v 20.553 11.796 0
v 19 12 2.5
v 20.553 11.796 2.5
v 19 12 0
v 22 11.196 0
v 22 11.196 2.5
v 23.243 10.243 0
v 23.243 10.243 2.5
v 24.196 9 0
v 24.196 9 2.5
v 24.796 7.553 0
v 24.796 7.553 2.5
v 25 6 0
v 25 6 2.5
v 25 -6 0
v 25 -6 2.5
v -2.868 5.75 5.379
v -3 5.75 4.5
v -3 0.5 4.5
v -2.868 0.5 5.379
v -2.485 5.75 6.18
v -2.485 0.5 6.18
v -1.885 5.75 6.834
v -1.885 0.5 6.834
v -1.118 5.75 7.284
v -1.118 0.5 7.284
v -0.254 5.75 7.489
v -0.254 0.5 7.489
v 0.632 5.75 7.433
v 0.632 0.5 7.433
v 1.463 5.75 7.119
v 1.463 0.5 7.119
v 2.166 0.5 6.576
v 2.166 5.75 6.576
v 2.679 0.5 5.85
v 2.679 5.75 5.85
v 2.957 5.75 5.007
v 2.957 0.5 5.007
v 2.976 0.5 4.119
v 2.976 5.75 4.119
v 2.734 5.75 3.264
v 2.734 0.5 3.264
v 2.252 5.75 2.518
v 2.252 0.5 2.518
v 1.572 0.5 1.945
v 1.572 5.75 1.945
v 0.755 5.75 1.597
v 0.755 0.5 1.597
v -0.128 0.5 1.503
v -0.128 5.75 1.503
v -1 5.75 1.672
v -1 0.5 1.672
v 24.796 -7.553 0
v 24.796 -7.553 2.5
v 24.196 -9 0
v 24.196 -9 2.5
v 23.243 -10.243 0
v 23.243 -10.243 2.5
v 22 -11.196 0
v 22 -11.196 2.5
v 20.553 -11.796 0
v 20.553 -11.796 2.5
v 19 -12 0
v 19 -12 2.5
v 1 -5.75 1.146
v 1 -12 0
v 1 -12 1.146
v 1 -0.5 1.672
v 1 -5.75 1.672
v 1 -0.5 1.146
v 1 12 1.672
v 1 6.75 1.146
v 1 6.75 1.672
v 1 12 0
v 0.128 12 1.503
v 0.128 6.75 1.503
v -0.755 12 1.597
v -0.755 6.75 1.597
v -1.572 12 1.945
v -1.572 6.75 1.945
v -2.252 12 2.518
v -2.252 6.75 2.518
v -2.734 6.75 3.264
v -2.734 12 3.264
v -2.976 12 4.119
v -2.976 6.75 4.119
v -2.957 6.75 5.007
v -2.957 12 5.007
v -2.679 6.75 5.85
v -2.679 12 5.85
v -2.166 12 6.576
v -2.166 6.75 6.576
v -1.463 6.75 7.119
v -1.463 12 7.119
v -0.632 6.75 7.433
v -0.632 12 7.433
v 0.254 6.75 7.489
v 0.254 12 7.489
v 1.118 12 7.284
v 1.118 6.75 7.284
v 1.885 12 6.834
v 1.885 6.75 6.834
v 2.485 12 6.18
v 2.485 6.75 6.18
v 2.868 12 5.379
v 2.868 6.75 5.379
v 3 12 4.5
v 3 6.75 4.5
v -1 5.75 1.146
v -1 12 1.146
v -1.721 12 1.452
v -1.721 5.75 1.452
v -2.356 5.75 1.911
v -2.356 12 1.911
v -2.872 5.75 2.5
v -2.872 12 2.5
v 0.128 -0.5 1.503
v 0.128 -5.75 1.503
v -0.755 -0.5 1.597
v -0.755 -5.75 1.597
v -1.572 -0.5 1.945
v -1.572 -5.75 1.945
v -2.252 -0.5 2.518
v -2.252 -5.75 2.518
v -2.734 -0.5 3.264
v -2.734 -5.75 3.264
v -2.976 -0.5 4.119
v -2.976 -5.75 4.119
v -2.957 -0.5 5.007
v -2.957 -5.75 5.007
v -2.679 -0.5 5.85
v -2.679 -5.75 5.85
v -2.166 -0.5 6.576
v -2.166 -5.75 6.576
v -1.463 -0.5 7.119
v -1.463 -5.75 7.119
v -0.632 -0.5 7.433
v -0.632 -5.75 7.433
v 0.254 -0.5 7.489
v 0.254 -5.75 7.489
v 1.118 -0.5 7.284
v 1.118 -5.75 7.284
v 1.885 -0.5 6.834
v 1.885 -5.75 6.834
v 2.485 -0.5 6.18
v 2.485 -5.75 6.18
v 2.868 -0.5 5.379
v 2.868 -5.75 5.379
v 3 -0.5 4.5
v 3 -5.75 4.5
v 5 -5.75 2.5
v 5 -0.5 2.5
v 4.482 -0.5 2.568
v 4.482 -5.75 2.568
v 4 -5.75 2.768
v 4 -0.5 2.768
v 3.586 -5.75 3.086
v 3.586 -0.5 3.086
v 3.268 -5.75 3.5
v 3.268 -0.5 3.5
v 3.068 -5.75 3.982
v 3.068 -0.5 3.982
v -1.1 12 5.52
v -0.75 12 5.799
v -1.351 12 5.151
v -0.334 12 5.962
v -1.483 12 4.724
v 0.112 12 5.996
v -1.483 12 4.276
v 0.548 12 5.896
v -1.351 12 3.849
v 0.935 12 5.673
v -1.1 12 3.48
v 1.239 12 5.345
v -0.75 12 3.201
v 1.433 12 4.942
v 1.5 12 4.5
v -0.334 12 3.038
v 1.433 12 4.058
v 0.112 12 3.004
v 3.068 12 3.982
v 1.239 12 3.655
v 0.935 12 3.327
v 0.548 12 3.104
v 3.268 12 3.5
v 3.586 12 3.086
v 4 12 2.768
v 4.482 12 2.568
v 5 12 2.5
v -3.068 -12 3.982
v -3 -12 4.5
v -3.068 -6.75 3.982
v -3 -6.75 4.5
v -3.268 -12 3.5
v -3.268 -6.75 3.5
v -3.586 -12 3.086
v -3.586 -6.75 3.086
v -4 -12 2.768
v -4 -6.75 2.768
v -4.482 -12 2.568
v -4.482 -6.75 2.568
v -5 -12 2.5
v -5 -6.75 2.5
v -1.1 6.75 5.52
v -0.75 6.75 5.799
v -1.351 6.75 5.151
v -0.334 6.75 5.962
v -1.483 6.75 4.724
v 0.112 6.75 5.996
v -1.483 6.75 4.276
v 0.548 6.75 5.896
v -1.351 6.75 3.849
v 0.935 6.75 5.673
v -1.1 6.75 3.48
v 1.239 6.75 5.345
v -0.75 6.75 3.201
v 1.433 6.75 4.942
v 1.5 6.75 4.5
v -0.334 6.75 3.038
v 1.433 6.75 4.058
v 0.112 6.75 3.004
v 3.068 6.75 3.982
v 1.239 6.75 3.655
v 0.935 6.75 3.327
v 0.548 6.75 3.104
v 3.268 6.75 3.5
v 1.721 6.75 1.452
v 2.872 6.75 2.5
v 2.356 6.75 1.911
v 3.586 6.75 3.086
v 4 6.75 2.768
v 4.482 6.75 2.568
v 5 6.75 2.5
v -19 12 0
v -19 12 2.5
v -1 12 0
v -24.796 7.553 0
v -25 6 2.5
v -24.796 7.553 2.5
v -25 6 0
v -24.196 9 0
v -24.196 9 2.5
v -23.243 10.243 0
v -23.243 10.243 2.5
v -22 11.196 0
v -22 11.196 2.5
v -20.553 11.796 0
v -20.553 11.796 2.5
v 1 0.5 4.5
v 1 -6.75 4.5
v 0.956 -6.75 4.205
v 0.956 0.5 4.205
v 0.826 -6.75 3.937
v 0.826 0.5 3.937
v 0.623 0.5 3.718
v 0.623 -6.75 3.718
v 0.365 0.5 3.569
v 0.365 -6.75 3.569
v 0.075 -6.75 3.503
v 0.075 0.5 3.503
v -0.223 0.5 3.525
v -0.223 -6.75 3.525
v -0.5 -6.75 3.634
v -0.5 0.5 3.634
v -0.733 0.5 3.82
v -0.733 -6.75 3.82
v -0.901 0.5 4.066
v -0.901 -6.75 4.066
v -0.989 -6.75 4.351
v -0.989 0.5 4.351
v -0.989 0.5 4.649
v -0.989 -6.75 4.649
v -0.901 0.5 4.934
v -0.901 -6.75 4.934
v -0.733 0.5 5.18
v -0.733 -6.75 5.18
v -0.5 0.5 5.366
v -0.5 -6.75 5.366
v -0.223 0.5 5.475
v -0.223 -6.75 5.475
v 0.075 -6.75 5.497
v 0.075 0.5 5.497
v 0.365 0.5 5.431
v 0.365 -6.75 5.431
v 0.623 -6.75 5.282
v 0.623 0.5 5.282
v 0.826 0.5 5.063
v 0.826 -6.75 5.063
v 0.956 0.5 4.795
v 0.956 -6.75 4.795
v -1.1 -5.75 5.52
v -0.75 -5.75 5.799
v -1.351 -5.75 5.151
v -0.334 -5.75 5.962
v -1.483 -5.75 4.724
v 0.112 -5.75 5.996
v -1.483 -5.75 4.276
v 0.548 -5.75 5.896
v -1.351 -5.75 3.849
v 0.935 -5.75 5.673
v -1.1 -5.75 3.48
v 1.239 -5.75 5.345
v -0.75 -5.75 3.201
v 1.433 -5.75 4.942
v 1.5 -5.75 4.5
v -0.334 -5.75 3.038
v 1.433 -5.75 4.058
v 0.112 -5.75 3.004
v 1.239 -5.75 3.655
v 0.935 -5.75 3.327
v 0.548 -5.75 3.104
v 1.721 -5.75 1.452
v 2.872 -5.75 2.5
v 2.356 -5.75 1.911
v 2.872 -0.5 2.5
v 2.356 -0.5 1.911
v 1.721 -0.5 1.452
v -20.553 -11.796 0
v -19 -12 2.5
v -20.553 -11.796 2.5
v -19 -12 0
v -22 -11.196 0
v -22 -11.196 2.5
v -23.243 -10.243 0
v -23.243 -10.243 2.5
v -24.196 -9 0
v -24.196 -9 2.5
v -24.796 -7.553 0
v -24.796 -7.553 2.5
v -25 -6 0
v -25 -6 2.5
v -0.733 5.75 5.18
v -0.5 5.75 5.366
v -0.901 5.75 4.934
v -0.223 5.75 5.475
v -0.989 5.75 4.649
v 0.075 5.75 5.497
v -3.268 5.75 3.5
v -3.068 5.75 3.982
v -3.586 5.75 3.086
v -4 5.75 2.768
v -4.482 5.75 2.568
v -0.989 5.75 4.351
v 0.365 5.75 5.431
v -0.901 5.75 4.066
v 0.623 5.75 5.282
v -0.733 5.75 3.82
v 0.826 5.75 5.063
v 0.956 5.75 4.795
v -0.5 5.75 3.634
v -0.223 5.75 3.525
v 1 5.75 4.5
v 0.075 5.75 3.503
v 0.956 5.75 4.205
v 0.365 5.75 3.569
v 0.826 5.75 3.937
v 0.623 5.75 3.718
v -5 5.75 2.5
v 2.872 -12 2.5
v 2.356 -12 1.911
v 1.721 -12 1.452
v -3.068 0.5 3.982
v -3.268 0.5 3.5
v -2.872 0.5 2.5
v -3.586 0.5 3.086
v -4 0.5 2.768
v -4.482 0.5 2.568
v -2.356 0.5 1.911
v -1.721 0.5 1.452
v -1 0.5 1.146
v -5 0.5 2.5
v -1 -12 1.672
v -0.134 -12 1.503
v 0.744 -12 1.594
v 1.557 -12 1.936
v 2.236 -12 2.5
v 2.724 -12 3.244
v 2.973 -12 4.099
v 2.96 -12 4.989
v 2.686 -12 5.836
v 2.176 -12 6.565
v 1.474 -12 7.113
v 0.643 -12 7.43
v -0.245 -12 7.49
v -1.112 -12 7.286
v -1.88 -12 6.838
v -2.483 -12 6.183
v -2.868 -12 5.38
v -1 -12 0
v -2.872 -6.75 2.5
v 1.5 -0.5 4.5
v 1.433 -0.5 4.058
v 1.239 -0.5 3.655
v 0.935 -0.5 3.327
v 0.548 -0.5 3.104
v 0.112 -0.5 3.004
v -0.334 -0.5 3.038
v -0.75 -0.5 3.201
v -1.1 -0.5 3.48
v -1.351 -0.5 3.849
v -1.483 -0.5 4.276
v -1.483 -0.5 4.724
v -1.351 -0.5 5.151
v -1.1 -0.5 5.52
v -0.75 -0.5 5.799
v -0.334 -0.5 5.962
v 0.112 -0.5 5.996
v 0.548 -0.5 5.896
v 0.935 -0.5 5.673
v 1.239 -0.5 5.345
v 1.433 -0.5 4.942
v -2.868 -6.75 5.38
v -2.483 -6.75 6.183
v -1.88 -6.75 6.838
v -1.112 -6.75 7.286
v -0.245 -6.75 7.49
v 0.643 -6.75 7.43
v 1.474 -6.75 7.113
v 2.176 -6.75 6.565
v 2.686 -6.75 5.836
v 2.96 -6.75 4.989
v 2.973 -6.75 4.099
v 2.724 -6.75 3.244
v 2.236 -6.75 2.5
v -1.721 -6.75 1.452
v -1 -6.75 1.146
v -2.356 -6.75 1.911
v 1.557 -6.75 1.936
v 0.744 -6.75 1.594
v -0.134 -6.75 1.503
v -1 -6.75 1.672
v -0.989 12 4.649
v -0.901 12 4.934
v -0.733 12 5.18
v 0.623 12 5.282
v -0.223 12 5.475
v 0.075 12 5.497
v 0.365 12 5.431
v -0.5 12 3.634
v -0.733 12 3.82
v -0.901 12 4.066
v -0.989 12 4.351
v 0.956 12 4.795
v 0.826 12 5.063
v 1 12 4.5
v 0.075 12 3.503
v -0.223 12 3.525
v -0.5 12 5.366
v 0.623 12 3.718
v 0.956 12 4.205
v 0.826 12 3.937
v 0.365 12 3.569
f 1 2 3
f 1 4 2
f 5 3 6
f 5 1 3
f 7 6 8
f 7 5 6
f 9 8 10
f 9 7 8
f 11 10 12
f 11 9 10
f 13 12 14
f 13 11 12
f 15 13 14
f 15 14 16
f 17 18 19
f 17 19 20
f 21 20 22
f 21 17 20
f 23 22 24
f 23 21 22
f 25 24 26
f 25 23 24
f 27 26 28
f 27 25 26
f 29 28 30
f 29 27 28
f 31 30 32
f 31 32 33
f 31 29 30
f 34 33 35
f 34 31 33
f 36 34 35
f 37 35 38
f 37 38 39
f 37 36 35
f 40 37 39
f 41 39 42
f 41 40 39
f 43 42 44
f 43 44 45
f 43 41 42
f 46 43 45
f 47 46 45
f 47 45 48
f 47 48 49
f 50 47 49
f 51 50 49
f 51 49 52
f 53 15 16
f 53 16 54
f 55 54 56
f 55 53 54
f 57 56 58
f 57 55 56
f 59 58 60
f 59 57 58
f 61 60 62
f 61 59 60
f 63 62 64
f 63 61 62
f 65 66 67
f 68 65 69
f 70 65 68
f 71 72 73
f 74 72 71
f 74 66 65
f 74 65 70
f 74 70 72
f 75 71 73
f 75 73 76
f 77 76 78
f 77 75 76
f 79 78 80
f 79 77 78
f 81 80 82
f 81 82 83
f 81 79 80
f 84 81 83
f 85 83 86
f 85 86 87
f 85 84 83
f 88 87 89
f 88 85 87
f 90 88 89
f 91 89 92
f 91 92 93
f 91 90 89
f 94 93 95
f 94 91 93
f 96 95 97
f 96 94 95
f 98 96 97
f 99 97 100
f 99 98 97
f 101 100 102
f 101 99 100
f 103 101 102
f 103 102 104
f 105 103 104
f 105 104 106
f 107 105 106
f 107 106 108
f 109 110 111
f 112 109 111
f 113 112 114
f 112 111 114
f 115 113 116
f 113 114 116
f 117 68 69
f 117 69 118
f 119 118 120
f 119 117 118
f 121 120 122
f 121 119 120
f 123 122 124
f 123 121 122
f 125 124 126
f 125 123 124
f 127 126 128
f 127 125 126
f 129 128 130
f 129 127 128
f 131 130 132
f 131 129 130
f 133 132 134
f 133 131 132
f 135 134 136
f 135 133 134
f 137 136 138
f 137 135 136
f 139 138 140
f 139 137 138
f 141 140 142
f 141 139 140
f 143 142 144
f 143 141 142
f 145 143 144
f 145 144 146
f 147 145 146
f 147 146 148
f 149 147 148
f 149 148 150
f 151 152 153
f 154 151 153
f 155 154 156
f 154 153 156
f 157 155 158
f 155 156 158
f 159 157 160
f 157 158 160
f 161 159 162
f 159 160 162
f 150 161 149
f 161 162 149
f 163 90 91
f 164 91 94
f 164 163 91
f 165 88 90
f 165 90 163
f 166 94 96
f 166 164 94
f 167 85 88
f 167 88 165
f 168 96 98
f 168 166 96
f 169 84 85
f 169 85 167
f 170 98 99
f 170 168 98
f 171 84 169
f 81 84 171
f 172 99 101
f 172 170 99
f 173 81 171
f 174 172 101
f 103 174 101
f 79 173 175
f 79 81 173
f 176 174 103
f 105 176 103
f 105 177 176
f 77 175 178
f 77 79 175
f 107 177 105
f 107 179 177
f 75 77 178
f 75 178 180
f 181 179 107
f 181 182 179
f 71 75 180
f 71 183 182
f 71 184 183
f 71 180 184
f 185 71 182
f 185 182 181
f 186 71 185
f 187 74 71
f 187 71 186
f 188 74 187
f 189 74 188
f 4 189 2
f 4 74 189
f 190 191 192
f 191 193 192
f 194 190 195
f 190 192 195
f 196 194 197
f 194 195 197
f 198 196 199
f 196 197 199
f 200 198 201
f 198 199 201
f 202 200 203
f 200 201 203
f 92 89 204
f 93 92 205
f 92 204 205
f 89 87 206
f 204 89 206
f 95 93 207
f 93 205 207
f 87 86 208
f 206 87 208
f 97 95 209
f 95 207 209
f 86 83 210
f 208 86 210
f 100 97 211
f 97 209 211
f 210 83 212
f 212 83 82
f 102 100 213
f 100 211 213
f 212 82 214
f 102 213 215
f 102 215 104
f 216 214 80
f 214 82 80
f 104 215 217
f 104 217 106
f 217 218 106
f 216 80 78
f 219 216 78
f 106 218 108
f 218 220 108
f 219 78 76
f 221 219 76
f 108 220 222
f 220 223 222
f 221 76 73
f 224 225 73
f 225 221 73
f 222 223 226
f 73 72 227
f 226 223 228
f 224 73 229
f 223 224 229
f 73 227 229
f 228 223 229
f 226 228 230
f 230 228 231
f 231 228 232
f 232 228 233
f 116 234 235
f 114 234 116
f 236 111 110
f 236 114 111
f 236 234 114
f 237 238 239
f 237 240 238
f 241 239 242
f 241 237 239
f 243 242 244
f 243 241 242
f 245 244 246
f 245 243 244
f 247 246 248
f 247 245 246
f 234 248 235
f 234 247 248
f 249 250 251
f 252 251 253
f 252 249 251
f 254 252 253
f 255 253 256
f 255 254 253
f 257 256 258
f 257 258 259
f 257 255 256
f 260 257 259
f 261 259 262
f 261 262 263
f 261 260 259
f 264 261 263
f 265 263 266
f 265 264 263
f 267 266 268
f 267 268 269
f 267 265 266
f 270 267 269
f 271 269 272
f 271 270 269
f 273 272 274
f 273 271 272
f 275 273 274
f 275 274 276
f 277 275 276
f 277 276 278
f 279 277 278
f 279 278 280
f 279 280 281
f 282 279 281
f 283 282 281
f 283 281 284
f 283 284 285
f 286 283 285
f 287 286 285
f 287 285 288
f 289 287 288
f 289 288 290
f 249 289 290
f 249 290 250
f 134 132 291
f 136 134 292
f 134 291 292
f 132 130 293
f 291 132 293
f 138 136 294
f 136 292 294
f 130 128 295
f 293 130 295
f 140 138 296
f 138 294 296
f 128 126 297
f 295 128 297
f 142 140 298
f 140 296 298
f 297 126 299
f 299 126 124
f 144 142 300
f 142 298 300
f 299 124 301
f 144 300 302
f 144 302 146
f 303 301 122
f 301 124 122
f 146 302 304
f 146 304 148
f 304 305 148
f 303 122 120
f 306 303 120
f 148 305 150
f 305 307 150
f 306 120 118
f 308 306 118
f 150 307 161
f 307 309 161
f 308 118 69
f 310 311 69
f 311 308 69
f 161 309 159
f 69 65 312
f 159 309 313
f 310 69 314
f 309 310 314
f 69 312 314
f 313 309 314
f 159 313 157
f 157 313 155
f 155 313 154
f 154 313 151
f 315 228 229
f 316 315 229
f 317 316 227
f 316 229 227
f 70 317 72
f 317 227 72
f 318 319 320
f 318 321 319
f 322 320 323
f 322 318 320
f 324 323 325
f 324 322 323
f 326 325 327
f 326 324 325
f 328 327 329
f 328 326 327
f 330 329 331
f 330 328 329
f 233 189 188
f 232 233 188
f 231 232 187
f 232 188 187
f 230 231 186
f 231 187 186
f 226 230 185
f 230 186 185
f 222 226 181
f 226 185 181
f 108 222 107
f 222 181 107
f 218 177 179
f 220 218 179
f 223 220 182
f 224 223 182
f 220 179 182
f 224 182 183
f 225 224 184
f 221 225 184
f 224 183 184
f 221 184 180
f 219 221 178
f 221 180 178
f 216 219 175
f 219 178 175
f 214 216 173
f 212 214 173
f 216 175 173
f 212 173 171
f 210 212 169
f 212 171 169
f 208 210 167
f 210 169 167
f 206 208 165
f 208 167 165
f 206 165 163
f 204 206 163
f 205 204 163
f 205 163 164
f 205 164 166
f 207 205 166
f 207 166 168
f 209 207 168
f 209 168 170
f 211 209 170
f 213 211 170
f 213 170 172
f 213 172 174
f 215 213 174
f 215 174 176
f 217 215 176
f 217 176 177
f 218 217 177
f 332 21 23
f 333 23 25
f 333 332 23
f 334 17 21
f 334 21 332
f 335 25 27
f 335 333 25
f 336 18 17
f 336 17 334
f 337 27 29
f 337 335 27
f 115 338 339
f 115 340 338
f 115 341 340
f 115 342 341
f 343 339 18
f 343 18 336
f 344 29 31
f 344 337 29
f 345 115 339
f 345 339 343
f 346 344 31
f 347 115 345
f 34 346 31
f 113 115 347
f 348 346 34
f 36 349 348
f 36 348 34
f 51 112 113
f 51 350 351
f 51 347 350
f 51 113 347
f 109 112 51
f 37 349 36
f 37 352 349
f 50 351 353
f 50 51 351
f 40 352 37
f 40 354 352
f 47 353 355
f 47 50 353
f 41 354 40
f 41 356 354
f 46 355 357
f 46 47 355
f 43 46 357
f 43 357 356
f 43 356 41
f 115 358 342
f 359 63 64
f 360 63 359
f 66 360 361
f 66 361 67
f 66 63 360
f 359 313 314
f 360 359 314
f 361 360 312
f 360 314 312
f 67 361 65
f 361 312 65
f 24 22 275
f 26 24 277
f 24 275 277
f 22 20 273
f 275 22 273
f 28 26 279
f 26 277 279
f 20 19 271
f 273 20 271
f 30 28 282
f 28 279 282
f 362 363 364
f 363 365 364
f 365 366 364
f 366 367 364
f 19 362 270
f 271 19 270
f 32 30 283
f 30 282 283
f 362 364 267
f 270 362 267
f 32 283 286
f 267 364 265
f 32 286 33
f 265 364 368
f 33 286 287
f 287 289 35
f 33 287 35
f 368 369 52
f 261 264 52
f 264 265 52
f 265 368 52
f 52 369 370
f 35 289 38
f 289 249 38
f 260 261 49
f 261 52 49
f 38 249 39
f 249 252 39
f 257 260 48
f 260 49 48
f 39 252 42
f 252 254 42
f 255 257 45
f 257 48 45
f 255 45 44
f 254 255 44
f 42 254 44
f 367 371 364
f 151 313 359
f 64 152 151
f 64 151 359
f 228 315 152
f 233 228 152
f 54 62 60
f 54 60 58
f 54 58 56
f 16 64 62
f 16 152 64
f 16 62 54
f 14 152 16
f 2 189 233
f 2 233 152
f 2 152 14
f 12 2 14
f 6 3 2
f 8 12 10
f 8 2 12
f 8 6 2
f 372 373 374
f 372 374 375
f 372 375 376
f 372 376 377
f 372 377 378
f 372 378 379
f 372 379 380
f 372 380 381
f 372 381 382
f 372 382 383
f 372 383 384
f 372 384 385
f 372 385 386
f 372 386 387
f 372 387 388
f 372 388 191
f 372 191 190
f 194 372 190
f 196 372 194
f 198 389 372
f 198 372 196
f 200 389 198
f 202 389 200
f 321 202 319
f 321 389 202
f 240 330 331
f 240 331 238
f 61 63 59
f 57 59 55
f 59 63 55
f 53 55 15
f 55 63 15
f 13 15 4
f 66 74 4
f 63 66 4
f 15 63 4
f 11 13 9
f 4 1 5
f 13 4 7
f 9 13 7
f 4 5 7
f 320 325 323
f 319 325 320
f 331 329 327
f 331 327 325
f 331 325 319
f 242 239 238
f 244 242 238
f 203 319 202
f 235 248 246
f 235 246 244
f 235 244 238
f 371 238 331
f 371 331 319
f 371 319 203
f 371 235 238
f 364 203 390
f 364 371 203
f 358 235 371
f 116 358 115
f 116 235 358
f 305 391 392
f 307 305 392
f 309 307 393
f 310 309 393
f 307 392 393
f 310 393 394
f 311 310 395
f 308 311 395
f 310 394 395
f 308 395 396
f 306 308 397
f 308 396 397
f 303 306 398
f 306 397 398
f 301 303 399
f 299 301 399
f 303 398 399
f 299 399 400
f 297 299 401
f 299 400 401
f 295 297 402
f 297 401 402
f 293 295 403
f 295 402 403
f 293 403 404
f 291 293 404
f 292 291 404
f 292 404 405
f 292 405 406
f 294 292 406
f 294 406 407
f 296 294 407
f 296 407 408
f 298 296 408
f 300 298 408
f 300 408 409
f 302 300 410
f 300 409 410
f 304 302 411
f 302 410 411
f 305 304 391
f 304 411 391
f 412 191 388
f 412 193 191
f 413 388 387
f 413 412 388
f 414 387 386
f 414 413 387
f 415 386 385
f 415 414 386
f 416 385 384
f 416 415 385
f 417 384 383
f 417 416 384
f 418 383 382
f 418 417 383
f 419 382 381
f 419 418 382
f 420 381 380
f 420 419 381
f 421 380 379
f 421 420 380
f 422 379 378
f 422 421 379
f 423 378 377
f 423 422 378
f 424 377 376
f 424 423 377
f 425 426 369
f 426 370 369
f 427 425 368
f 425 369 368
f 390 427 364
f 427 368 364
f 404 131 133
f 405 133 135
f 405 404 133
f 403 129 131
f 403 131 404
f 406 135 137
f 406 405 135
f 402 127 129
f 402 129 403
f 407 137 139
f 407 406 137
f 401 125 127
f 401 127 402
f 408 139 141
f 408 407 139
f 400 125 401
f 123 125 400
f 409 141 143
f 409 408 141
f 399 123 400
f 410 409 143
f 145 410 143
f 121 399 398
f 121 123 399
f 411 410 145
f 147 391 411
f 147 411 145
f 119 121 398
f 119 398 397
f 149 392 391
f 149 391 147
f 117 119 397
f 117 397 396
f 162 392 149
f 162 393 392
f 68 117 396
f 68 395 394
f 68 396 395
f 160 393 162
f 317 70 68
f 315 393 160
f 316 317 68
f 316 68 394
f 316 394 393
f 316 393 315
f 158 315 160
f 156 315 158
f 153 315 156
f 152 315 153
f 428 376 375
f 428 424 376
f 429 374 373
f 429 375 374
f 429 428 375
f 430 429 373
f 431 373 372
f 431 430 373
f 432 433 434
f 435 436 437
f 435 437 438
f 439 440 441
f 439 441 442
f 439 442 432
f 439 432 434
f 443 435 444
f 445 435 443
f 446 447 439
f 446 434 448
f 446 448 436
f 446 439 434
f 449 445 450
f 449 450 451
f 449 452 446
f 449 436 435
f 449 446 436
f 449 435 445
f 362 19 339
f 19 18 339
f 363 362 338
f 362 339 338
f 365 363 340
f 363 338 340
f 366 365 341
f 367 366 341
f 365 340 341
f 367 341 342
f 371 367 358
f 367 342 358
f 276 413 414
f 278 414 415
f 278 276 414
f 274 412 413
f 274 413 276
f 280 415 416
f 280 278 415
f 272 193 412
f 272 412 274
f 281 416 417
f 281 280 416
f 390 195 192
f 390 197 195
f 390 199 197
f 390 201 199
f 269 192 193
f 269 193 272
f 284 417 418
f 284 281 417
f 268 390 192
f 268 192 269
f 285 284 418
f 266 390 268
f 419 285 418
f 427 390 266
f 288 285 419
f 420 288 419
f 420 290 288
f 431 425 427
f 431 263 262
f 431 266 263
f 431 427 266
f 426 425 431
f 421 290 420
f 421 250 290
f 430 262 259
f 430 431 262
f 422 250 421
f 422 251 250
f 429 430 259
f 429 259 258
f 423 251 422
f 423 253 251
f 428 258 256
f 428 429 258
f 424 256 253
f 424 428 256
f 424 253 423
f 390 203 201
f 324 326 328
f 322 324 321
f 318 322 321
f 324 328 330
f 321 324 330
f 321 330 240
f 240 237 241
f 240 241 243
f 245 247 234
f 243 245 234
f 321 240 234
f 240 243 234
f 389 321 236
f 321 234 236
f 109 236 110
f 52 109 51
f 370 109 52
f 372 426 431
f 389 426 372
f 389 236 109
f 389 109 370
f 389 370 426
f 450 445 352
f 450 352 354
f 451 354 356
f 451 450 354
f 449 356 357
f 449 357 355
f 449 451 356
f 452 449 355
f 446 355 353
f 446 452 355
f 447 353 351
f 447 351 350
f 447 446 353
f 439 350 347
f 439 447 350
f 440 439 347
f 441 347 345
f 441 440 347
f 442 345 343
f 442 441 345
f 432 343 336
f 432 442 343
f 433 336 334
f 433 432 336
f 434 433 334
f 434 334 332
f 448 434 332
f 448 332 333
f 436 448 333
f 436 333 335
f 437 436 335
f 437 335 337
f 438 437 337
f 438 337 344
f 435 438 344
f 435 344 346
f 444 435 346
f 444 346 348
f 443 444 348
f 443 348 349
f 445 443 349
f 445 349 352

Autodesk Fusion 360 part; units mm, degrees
sketch "Sketch1" plane through (0, 0, 0) normal (0, 0, 1) x (1, 0, 0)
  line L0 (25, -12) -> (-25, -12) construction
  line L1 (-25, -6) -> (-25, 6) construction
  line L2 (-25, 12) -> (25, 12) construction
  line L3 (25, 6) -> (25, -12) construction
  line L4 (25, -12) -> (-25, 12) construction
  line L5 (-25, -12) -> (25, 12) construction
  line L6 (0, 12) -> (0, -12) construction
  line L7 (-19, 12) -> (-1, 12)
  line L8 (-1, 12) -> (-1, -12)
  line L9 (-1, -12) -> (-19, -12)
  line L10 (-25, -12) -> (-25, 12)
  line L11 (1, 12) -> (19, 12)
  line L12 (25, 12) -> (25, -6)
  line L13 (19, -12) -> (1, -12)
  line L14 (1, -12) -> (1, 12)
  arc A0 (-19, 12) -> (-25, 6) centre (-19, 6) ccw
  arc A1 (-25, -6) -> (-19, -12) centre (-19, -6) ccw
  arc A2 (19, -12) -> (25, -6) centre (19, -6) ccw
  arc A3 (25, 6) -> (19, 12) centre (19, 6) ccw
  dimension "d1" = 6
  dimension "d2" = 6
  dimension "d3" = 6
extrude "Extrude1" add sketch "Sketch1" along normal blind 2.5 makes body 1 at (-7, -4, 0) makes body 2 at (7, 4, 0)
sketch "Sketch2" plane through (0, 12, 0) normal (0, 1, 0) x (1, 0, 0)
  line L0 (-19, -2.5) -> (-5, -2.5)
  circle A0 centre (0, -4.5) radius 3
  circle A1 centre (0, -4.5) radius 1.5
  line L1 (-3, -4.5) -> (-3, -4.5) construction
  line L2 (3, -4.5) -> (3, -4.5) construction
  arc A2 (-3, -4.5) -> (-5, -2.5) centre (-5, -4.5) ccw
  line L3 (5, -2.5) -> (7.5, -2.5) construction
  arc A3 (5, -2.5) -> (3, -4.5) centre (5, -4.5) ccw
  line L4 (-5, -2.5) -> (5, -2.5)
  circle A4 centre (0, -4.5) radius 1.25
  line L5 (-1, 0) -> (-19, 0)
  line L6 (-19, 0) -> (-19, -2.5)
  line L7 (-19, -2.5) -> (-1, -2.5)
  line L8 (-1, -2.5) -> (-1, 0)
  point P0 (19, -2.5)
  dimension "d6" = 38
  dimension "d7" = 6
  dimension "d8" = 3
  dimension "d9" = 2
  dimension "d10" = 2
  dimension "d11" = 2.5
extrude "Extrude2" add sketch "Sketch2" against normal blind 5.25 contours A0 A2 L4 L7 | A0 L4 L7 | A0 A3 L4 bodies 1 2
extrude "Extrude3" add sketch "Sketch2" against normal blind 5.25 from surface at -6.25 contours A0 A2 L4 L7 | A0 L4 L7 | A0 A3 L4 | A1 bodies 1
extrude "Extrude4" add sketch "Sketch2" against normal blind 5.25 from surface at -12.5 contours A0 A2 L4 L7 | A0 L4 L7 | A0 A3 L4 bodies 1
extrude "Extrude5" add sketch "Sketch2" against normal blind 5.25 from surface at -18.75 contours A0 A2 L4 L7 | A0 L4 L7 | A0 A3 L4 | A1 bodies 1
extrude "Extrude6" add sketch "Sketch2" against normal blind 24 contours A4 bodies 1
sketch "Sketch3" plane through (0, 12, 5.583) normal (0, 1, 0) x (1, 0, 0)
sketch "Sketch4" plane through (0, 12, 0) normal (0, 1, 0) x (1, 0, 0)
  circle A0 centre (0, -4.5) radius 1
  dimension "d25" = 2
extrude "Extrude7" cut sketch "Sketch2" against normal blind 24 contours A4 bodies 1
extrude "Extrude8" add sketch "Sketch2" against normal blind 5.25 from surface at -6.25 contours A4 bodies 1
extrude "Extrude9" add sketch "Sketch2" against normal blind 5.25 from surface at -18.75 contours A4 bodies 1
extrude "Extrude10" add sketch "Sketch4" against normal blind 24 bodies 1
extrude "Extrude11" cut sketch "Sketch2" against normal blind 5.25 contours A0 A2 L4 L7 bodies 1
extrude "Extrude12" cut sketch "Sketch2" against normal blind 5.25 from surface at -12.5 contours A0 A2 L4 L7 bodies 1
extrude "Extrude13" cut sketch "Sketch2" against normal blind 5.25 from surface at -6.25 contours A0 A3 L4 bodies 1
extrude "Extrude14" cut sketch "Sketch2" against normal blind 5.25 from surface at -18.75 contours A0 A3 L4 bodies 1
extrude "Extrude15" add sketch "Sketch2" against normal blind 5.25 contours A0 L4 L7 L8 | A0 L4 L8 bodies 1
extrude "Extrude16" add sketch "Sketch2" against normal blind 5.25 from surface at -6.25 contours A0 L4 L7 L8 | A0 L4 L8 bodies 1
extrude "Extrude17" add sketch "Sketch2" against normal blind 5.25 from surface at -12.5 contours A0 L4 L7 L8 | A0 L4 L8 bodies 1
extrude "Extrude18" add sketch "Sketch2" against normal blind 5.25 from surface at -18.75 contours A0 L4 L7 L8 | A0 L4 L8 bodies 1
sketch "Sketch5" plane through (0, 12, 0) normal (0, 1, 0) x (1, 0, 0)
  circle A0 centre (0, -4.5) radius 3
  circle A1 centre (0, -4.5) radius 3.5
  line L0 (-1, -2.5) -> (-3.5, -2.5)
  line L1 (-3.5, -2.5) -> (-3.5, -0.7)
  line L2 (-3.5, -0.7) -> (-1, -0.7)
  line L3 (-1, -0.7) -> (-1, -2.5)
  line L4 (1, -0.7) -> (3.5, -0.7)
  line L5 (3.5, -0.7) -> (3.5, -2.5)
  line L6 (3.5, -2.5) -> (1, -2.5)
  line L7 (1, -2.5) -> (1, -0.7)
  dimension "d58" = 6
  dimension "d59" = 7
extrude "Extrude19" cut sketch "Sketch5" against normal blind 6.25 contours A0 A1 L0 L3 bodies 1
extrude "Extrude20" cut sketch "Sketch5" against normal blind 7.25 from surface at -11.5 contours A0 A1 L0 L3 bodies 1
extrude "Extrude21" cut sketch "Sketch5" against normal blind 1 from surface at -5.25 contours A0 L6 L7 | A0 L0 L3 bodies 1
extrude "Extrude22" cut sketch "Sketch5" against normal blind 1 from surface at -11.5 contours A0 L6 L7 | A0 L0 L3 bodies 1
extrude "Extrude23" cut sketch "Sketch5" against normal blind 1 from surface at -17.75 contours A0 L6 L7 | A0 L0 L3 bodies 1
extrude "Extrude24" cut sketch "Sketch5" against normal blind 7.25 from surface at -5.25 contours A0 A1 L6 L7 bodies 1
extrude "Extrude25" cut sketch "Sketch5" against normal blind 6.25 from surface at -17.75 contours A0 A1 L6 L7 bodies 1 makes body 3 at (7, 4, 0)
